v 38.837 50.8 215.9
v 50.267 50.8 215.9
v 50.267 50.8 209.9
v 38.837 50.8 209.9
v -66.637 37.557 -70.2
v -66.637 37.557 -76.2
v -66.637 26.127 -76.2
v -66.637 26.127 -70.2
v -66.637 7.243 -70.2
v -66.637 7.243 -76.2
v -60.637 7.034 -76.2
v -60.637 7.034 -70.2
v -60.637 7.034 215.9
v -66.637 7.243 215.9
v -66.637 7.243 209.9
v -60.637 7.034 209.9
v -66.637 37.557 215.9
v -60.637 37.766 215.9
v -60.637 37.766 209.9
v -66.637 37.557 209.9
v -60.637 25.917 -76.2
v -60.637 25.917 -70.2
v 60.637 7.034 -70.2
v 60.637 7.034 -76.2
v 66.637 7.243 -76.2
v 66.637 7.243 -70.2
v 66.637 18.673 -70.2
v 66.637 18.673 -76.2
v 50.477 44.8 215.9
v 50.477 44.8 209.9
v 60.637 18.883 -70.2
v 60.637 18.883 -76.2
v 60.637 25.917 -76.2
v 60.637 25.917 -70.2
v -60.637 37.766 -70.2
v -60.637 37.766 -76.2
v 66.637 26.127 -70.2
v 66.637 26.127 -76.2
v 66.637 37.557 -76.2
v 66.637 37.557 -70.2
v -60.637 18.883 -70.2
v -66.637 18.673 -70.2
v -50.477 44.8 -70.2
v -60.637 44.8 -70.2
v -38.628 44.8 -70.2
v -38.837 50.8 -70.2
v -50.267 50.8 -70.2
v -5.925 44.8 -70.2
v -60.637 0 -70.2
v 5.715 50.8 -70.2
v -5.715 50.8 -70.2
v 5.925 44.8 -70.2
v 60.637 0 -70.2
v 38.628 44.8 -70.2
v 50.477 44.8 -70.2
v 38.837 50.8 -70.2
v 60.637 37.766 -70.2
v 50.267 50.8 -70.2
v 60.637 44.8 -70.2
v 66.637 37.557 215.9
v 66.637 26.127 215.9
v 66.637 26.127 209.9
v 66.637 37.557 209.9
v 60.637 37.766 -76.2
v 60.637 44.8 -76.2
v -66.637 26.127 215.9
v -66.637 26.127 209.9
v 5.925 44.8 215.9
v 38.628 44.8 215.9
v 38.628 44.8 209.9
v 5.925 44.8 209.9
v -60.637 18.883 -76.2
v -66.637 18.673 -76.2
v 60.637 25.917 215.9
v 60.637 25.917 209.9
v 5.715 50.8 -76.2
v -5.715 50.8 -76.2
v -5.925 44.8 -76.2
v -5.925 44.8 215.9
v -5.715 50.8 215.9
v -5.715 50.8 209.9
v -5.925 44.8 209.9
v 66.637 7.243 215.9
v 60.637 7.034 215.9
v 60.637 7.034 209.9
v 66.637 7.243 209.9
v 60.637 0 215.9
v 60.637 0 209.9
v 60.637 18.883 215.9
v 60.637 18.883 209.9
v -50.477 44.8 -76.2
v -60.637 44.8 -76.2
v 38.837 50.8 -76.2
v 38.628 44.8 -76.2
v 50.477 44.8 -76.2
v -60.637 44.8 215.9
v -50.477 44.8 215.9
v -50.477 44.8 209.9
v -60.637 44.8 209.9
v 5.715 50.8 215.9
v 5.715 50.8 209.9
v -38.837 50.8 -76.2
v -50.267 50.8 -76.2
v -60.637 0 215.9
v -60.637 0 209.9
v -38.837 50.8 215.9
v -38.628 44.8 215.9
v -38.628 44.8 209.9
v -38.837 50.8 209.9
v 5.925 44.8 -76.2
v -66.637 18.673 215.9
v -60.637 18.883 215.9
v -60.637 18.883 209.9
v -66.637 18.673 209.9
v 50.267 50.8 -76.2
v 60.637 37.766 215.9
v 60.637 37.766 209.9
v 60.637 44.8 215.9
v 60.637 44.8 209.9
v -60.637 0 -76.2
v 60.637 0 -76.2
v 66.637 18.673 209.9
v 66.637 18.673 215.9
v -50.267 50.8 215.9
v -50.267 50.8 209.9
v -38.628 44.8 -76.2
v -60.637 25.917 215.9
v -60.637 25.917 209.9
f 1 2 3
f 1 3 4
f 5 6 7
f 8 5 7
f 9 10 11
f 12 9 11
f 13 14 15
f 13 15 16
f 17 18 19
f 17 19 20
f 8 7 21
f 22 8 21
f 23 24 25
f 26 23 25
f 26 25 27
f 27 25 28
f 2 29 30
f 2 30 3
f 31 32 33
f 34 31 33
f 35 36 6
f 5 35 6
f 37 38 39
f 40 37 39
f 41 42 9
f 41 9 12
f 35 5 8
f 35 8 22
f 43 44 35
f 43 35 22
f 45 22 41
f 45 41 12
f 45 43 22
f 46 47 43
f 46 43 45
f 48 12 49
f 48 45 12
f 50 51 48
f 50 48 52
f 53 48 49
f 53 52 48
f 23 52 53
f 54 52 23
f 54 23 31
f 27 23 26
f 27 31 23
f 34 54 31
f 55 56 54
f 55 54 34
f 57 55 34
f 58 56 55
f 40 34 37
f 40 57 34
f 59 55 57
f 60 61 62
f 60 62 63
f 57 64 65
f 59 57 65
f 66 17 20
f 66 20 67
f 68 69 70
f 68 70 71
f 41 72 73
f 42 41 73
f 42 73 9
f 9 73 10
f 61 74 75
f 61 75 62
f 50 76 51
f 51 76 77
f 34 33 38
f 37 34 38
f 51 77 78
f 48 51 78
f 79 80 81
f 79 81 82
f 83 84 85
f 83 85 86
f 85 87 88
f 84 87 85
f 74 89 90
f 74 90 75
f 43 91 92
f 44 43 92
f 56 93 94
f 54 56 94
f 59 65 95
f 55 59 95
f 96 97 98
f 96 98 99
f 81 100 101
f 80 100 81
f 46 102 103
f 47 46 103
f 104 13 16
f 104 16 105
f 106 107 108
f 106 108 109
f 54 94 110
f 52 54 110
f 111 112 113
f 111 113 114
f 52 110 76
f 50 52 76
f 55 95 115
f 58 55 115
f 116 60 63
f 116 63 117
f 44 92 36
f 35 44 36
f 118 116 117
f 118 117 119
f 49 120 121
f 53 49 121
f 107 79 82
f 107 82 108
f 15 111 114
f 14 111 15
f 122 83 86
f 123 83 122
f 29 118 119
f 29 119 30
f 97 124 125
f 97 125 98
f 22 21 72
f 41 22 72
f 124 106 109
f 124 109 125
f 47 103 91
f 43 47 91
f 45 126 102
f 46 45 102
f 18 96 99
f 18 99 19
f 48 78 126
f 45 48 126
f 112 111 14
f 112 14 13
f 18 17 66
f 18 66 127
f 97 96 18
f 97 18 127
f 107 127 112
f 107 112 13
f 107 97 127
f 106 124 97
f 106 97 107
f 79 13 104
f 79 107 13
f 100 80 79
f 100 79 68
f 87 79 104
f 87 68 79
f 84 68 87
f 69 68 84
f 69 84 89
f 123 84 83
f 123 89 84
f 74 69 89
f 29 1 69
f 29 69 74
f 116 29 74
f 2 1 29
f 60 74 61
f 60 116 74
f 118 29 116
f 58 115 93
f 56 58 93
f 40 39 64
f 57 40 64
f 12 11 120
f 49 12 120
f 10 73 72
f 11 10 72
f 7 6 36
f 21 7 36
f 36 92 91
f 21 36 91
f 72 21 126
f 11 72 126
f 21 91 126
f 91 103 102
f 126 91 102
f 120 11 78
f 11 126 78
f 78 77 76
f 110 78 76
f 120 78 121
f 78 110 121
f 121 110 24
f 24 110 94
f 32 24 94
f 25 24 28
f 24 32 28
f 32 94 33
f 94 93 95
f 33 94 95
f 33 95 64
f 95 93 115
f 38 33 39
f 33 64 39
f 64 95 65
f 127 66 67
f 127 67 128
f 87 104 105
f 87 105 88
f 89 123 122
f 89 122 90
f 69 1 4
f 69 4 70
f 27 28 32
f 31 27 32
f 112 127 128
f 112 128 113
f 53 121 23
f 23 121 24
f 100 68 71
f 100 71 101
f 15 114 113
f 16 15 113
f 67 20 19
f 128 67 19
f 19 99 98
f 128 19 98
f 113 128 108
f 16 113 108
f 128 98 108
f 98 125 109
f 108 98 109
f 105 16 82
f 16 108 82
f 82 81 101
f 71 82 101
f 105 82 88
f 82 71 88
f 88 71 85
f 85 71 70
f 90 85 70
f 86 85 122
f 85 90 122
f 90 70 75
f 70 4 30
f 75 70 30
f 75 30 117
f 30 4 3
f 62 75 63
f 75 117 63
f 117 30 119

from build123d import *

# Parameters (mm, degrees)
BOSS_EXTRUDE1_DEPTH = 6


with BuildPart() as part:
    # Sketch1 → Boss-Extrude1 (new body)
    with BuildSketch(Plane(origin=(0, 0, -76.2), x_dir=(-1, 0, 0), z_dir=(0, 0, -1))):
        Polygon((-50.47683298, 44.8), (-50.267308364, 50.8), (-38.837308364, 50.8), (-38.627783747, 44.8), (-5.924524617, 44.8), (-5.715, 50.8), (5.715, 50.8), (5.924524617, 44.8), (38.627783747, 44.8), (38.837308364, 50.8), (50.267308364, 50.8), (50.47683298, 44.8), (60.63683298, 44.8), (60.63683298, 37.766032823), (66.63683298, 37.556508206), (66.63683298, 26.126508206), (60.63683298, 25.916983589), (60.63683298, 18.883016411), (66.63683298, 18.673491794), (66.63683298, 7.243491794), (60.63683298, 7.033967177), (60.63683298, 0), (-60.63683298, 0), (-60.63683298, 7.033967177), (-66.63683298, 7.243491794), (-66.63683298, 18.673491794), (-60.63683298, 18.883016411), (-60.63683298, 25.916983589), (-66.63683298, 26.126508206), (-66.63683298, 37.556508206), (-60.63683298, 37.766032823), (-60.63683298, 44.8), align=None)
    extrude(amount=-BOSS_EXTRUDE1_DEPTH)


with BuildPart() as body_2:
    # Mirror1: mirrored copy
    add(part.part.mirror(Plane(origin=(0, 0, 69.85), x_dir=(1, 0, 0), z_dir=(0, 0, -1))))


solid = Compound([part.part, body_2.part])
